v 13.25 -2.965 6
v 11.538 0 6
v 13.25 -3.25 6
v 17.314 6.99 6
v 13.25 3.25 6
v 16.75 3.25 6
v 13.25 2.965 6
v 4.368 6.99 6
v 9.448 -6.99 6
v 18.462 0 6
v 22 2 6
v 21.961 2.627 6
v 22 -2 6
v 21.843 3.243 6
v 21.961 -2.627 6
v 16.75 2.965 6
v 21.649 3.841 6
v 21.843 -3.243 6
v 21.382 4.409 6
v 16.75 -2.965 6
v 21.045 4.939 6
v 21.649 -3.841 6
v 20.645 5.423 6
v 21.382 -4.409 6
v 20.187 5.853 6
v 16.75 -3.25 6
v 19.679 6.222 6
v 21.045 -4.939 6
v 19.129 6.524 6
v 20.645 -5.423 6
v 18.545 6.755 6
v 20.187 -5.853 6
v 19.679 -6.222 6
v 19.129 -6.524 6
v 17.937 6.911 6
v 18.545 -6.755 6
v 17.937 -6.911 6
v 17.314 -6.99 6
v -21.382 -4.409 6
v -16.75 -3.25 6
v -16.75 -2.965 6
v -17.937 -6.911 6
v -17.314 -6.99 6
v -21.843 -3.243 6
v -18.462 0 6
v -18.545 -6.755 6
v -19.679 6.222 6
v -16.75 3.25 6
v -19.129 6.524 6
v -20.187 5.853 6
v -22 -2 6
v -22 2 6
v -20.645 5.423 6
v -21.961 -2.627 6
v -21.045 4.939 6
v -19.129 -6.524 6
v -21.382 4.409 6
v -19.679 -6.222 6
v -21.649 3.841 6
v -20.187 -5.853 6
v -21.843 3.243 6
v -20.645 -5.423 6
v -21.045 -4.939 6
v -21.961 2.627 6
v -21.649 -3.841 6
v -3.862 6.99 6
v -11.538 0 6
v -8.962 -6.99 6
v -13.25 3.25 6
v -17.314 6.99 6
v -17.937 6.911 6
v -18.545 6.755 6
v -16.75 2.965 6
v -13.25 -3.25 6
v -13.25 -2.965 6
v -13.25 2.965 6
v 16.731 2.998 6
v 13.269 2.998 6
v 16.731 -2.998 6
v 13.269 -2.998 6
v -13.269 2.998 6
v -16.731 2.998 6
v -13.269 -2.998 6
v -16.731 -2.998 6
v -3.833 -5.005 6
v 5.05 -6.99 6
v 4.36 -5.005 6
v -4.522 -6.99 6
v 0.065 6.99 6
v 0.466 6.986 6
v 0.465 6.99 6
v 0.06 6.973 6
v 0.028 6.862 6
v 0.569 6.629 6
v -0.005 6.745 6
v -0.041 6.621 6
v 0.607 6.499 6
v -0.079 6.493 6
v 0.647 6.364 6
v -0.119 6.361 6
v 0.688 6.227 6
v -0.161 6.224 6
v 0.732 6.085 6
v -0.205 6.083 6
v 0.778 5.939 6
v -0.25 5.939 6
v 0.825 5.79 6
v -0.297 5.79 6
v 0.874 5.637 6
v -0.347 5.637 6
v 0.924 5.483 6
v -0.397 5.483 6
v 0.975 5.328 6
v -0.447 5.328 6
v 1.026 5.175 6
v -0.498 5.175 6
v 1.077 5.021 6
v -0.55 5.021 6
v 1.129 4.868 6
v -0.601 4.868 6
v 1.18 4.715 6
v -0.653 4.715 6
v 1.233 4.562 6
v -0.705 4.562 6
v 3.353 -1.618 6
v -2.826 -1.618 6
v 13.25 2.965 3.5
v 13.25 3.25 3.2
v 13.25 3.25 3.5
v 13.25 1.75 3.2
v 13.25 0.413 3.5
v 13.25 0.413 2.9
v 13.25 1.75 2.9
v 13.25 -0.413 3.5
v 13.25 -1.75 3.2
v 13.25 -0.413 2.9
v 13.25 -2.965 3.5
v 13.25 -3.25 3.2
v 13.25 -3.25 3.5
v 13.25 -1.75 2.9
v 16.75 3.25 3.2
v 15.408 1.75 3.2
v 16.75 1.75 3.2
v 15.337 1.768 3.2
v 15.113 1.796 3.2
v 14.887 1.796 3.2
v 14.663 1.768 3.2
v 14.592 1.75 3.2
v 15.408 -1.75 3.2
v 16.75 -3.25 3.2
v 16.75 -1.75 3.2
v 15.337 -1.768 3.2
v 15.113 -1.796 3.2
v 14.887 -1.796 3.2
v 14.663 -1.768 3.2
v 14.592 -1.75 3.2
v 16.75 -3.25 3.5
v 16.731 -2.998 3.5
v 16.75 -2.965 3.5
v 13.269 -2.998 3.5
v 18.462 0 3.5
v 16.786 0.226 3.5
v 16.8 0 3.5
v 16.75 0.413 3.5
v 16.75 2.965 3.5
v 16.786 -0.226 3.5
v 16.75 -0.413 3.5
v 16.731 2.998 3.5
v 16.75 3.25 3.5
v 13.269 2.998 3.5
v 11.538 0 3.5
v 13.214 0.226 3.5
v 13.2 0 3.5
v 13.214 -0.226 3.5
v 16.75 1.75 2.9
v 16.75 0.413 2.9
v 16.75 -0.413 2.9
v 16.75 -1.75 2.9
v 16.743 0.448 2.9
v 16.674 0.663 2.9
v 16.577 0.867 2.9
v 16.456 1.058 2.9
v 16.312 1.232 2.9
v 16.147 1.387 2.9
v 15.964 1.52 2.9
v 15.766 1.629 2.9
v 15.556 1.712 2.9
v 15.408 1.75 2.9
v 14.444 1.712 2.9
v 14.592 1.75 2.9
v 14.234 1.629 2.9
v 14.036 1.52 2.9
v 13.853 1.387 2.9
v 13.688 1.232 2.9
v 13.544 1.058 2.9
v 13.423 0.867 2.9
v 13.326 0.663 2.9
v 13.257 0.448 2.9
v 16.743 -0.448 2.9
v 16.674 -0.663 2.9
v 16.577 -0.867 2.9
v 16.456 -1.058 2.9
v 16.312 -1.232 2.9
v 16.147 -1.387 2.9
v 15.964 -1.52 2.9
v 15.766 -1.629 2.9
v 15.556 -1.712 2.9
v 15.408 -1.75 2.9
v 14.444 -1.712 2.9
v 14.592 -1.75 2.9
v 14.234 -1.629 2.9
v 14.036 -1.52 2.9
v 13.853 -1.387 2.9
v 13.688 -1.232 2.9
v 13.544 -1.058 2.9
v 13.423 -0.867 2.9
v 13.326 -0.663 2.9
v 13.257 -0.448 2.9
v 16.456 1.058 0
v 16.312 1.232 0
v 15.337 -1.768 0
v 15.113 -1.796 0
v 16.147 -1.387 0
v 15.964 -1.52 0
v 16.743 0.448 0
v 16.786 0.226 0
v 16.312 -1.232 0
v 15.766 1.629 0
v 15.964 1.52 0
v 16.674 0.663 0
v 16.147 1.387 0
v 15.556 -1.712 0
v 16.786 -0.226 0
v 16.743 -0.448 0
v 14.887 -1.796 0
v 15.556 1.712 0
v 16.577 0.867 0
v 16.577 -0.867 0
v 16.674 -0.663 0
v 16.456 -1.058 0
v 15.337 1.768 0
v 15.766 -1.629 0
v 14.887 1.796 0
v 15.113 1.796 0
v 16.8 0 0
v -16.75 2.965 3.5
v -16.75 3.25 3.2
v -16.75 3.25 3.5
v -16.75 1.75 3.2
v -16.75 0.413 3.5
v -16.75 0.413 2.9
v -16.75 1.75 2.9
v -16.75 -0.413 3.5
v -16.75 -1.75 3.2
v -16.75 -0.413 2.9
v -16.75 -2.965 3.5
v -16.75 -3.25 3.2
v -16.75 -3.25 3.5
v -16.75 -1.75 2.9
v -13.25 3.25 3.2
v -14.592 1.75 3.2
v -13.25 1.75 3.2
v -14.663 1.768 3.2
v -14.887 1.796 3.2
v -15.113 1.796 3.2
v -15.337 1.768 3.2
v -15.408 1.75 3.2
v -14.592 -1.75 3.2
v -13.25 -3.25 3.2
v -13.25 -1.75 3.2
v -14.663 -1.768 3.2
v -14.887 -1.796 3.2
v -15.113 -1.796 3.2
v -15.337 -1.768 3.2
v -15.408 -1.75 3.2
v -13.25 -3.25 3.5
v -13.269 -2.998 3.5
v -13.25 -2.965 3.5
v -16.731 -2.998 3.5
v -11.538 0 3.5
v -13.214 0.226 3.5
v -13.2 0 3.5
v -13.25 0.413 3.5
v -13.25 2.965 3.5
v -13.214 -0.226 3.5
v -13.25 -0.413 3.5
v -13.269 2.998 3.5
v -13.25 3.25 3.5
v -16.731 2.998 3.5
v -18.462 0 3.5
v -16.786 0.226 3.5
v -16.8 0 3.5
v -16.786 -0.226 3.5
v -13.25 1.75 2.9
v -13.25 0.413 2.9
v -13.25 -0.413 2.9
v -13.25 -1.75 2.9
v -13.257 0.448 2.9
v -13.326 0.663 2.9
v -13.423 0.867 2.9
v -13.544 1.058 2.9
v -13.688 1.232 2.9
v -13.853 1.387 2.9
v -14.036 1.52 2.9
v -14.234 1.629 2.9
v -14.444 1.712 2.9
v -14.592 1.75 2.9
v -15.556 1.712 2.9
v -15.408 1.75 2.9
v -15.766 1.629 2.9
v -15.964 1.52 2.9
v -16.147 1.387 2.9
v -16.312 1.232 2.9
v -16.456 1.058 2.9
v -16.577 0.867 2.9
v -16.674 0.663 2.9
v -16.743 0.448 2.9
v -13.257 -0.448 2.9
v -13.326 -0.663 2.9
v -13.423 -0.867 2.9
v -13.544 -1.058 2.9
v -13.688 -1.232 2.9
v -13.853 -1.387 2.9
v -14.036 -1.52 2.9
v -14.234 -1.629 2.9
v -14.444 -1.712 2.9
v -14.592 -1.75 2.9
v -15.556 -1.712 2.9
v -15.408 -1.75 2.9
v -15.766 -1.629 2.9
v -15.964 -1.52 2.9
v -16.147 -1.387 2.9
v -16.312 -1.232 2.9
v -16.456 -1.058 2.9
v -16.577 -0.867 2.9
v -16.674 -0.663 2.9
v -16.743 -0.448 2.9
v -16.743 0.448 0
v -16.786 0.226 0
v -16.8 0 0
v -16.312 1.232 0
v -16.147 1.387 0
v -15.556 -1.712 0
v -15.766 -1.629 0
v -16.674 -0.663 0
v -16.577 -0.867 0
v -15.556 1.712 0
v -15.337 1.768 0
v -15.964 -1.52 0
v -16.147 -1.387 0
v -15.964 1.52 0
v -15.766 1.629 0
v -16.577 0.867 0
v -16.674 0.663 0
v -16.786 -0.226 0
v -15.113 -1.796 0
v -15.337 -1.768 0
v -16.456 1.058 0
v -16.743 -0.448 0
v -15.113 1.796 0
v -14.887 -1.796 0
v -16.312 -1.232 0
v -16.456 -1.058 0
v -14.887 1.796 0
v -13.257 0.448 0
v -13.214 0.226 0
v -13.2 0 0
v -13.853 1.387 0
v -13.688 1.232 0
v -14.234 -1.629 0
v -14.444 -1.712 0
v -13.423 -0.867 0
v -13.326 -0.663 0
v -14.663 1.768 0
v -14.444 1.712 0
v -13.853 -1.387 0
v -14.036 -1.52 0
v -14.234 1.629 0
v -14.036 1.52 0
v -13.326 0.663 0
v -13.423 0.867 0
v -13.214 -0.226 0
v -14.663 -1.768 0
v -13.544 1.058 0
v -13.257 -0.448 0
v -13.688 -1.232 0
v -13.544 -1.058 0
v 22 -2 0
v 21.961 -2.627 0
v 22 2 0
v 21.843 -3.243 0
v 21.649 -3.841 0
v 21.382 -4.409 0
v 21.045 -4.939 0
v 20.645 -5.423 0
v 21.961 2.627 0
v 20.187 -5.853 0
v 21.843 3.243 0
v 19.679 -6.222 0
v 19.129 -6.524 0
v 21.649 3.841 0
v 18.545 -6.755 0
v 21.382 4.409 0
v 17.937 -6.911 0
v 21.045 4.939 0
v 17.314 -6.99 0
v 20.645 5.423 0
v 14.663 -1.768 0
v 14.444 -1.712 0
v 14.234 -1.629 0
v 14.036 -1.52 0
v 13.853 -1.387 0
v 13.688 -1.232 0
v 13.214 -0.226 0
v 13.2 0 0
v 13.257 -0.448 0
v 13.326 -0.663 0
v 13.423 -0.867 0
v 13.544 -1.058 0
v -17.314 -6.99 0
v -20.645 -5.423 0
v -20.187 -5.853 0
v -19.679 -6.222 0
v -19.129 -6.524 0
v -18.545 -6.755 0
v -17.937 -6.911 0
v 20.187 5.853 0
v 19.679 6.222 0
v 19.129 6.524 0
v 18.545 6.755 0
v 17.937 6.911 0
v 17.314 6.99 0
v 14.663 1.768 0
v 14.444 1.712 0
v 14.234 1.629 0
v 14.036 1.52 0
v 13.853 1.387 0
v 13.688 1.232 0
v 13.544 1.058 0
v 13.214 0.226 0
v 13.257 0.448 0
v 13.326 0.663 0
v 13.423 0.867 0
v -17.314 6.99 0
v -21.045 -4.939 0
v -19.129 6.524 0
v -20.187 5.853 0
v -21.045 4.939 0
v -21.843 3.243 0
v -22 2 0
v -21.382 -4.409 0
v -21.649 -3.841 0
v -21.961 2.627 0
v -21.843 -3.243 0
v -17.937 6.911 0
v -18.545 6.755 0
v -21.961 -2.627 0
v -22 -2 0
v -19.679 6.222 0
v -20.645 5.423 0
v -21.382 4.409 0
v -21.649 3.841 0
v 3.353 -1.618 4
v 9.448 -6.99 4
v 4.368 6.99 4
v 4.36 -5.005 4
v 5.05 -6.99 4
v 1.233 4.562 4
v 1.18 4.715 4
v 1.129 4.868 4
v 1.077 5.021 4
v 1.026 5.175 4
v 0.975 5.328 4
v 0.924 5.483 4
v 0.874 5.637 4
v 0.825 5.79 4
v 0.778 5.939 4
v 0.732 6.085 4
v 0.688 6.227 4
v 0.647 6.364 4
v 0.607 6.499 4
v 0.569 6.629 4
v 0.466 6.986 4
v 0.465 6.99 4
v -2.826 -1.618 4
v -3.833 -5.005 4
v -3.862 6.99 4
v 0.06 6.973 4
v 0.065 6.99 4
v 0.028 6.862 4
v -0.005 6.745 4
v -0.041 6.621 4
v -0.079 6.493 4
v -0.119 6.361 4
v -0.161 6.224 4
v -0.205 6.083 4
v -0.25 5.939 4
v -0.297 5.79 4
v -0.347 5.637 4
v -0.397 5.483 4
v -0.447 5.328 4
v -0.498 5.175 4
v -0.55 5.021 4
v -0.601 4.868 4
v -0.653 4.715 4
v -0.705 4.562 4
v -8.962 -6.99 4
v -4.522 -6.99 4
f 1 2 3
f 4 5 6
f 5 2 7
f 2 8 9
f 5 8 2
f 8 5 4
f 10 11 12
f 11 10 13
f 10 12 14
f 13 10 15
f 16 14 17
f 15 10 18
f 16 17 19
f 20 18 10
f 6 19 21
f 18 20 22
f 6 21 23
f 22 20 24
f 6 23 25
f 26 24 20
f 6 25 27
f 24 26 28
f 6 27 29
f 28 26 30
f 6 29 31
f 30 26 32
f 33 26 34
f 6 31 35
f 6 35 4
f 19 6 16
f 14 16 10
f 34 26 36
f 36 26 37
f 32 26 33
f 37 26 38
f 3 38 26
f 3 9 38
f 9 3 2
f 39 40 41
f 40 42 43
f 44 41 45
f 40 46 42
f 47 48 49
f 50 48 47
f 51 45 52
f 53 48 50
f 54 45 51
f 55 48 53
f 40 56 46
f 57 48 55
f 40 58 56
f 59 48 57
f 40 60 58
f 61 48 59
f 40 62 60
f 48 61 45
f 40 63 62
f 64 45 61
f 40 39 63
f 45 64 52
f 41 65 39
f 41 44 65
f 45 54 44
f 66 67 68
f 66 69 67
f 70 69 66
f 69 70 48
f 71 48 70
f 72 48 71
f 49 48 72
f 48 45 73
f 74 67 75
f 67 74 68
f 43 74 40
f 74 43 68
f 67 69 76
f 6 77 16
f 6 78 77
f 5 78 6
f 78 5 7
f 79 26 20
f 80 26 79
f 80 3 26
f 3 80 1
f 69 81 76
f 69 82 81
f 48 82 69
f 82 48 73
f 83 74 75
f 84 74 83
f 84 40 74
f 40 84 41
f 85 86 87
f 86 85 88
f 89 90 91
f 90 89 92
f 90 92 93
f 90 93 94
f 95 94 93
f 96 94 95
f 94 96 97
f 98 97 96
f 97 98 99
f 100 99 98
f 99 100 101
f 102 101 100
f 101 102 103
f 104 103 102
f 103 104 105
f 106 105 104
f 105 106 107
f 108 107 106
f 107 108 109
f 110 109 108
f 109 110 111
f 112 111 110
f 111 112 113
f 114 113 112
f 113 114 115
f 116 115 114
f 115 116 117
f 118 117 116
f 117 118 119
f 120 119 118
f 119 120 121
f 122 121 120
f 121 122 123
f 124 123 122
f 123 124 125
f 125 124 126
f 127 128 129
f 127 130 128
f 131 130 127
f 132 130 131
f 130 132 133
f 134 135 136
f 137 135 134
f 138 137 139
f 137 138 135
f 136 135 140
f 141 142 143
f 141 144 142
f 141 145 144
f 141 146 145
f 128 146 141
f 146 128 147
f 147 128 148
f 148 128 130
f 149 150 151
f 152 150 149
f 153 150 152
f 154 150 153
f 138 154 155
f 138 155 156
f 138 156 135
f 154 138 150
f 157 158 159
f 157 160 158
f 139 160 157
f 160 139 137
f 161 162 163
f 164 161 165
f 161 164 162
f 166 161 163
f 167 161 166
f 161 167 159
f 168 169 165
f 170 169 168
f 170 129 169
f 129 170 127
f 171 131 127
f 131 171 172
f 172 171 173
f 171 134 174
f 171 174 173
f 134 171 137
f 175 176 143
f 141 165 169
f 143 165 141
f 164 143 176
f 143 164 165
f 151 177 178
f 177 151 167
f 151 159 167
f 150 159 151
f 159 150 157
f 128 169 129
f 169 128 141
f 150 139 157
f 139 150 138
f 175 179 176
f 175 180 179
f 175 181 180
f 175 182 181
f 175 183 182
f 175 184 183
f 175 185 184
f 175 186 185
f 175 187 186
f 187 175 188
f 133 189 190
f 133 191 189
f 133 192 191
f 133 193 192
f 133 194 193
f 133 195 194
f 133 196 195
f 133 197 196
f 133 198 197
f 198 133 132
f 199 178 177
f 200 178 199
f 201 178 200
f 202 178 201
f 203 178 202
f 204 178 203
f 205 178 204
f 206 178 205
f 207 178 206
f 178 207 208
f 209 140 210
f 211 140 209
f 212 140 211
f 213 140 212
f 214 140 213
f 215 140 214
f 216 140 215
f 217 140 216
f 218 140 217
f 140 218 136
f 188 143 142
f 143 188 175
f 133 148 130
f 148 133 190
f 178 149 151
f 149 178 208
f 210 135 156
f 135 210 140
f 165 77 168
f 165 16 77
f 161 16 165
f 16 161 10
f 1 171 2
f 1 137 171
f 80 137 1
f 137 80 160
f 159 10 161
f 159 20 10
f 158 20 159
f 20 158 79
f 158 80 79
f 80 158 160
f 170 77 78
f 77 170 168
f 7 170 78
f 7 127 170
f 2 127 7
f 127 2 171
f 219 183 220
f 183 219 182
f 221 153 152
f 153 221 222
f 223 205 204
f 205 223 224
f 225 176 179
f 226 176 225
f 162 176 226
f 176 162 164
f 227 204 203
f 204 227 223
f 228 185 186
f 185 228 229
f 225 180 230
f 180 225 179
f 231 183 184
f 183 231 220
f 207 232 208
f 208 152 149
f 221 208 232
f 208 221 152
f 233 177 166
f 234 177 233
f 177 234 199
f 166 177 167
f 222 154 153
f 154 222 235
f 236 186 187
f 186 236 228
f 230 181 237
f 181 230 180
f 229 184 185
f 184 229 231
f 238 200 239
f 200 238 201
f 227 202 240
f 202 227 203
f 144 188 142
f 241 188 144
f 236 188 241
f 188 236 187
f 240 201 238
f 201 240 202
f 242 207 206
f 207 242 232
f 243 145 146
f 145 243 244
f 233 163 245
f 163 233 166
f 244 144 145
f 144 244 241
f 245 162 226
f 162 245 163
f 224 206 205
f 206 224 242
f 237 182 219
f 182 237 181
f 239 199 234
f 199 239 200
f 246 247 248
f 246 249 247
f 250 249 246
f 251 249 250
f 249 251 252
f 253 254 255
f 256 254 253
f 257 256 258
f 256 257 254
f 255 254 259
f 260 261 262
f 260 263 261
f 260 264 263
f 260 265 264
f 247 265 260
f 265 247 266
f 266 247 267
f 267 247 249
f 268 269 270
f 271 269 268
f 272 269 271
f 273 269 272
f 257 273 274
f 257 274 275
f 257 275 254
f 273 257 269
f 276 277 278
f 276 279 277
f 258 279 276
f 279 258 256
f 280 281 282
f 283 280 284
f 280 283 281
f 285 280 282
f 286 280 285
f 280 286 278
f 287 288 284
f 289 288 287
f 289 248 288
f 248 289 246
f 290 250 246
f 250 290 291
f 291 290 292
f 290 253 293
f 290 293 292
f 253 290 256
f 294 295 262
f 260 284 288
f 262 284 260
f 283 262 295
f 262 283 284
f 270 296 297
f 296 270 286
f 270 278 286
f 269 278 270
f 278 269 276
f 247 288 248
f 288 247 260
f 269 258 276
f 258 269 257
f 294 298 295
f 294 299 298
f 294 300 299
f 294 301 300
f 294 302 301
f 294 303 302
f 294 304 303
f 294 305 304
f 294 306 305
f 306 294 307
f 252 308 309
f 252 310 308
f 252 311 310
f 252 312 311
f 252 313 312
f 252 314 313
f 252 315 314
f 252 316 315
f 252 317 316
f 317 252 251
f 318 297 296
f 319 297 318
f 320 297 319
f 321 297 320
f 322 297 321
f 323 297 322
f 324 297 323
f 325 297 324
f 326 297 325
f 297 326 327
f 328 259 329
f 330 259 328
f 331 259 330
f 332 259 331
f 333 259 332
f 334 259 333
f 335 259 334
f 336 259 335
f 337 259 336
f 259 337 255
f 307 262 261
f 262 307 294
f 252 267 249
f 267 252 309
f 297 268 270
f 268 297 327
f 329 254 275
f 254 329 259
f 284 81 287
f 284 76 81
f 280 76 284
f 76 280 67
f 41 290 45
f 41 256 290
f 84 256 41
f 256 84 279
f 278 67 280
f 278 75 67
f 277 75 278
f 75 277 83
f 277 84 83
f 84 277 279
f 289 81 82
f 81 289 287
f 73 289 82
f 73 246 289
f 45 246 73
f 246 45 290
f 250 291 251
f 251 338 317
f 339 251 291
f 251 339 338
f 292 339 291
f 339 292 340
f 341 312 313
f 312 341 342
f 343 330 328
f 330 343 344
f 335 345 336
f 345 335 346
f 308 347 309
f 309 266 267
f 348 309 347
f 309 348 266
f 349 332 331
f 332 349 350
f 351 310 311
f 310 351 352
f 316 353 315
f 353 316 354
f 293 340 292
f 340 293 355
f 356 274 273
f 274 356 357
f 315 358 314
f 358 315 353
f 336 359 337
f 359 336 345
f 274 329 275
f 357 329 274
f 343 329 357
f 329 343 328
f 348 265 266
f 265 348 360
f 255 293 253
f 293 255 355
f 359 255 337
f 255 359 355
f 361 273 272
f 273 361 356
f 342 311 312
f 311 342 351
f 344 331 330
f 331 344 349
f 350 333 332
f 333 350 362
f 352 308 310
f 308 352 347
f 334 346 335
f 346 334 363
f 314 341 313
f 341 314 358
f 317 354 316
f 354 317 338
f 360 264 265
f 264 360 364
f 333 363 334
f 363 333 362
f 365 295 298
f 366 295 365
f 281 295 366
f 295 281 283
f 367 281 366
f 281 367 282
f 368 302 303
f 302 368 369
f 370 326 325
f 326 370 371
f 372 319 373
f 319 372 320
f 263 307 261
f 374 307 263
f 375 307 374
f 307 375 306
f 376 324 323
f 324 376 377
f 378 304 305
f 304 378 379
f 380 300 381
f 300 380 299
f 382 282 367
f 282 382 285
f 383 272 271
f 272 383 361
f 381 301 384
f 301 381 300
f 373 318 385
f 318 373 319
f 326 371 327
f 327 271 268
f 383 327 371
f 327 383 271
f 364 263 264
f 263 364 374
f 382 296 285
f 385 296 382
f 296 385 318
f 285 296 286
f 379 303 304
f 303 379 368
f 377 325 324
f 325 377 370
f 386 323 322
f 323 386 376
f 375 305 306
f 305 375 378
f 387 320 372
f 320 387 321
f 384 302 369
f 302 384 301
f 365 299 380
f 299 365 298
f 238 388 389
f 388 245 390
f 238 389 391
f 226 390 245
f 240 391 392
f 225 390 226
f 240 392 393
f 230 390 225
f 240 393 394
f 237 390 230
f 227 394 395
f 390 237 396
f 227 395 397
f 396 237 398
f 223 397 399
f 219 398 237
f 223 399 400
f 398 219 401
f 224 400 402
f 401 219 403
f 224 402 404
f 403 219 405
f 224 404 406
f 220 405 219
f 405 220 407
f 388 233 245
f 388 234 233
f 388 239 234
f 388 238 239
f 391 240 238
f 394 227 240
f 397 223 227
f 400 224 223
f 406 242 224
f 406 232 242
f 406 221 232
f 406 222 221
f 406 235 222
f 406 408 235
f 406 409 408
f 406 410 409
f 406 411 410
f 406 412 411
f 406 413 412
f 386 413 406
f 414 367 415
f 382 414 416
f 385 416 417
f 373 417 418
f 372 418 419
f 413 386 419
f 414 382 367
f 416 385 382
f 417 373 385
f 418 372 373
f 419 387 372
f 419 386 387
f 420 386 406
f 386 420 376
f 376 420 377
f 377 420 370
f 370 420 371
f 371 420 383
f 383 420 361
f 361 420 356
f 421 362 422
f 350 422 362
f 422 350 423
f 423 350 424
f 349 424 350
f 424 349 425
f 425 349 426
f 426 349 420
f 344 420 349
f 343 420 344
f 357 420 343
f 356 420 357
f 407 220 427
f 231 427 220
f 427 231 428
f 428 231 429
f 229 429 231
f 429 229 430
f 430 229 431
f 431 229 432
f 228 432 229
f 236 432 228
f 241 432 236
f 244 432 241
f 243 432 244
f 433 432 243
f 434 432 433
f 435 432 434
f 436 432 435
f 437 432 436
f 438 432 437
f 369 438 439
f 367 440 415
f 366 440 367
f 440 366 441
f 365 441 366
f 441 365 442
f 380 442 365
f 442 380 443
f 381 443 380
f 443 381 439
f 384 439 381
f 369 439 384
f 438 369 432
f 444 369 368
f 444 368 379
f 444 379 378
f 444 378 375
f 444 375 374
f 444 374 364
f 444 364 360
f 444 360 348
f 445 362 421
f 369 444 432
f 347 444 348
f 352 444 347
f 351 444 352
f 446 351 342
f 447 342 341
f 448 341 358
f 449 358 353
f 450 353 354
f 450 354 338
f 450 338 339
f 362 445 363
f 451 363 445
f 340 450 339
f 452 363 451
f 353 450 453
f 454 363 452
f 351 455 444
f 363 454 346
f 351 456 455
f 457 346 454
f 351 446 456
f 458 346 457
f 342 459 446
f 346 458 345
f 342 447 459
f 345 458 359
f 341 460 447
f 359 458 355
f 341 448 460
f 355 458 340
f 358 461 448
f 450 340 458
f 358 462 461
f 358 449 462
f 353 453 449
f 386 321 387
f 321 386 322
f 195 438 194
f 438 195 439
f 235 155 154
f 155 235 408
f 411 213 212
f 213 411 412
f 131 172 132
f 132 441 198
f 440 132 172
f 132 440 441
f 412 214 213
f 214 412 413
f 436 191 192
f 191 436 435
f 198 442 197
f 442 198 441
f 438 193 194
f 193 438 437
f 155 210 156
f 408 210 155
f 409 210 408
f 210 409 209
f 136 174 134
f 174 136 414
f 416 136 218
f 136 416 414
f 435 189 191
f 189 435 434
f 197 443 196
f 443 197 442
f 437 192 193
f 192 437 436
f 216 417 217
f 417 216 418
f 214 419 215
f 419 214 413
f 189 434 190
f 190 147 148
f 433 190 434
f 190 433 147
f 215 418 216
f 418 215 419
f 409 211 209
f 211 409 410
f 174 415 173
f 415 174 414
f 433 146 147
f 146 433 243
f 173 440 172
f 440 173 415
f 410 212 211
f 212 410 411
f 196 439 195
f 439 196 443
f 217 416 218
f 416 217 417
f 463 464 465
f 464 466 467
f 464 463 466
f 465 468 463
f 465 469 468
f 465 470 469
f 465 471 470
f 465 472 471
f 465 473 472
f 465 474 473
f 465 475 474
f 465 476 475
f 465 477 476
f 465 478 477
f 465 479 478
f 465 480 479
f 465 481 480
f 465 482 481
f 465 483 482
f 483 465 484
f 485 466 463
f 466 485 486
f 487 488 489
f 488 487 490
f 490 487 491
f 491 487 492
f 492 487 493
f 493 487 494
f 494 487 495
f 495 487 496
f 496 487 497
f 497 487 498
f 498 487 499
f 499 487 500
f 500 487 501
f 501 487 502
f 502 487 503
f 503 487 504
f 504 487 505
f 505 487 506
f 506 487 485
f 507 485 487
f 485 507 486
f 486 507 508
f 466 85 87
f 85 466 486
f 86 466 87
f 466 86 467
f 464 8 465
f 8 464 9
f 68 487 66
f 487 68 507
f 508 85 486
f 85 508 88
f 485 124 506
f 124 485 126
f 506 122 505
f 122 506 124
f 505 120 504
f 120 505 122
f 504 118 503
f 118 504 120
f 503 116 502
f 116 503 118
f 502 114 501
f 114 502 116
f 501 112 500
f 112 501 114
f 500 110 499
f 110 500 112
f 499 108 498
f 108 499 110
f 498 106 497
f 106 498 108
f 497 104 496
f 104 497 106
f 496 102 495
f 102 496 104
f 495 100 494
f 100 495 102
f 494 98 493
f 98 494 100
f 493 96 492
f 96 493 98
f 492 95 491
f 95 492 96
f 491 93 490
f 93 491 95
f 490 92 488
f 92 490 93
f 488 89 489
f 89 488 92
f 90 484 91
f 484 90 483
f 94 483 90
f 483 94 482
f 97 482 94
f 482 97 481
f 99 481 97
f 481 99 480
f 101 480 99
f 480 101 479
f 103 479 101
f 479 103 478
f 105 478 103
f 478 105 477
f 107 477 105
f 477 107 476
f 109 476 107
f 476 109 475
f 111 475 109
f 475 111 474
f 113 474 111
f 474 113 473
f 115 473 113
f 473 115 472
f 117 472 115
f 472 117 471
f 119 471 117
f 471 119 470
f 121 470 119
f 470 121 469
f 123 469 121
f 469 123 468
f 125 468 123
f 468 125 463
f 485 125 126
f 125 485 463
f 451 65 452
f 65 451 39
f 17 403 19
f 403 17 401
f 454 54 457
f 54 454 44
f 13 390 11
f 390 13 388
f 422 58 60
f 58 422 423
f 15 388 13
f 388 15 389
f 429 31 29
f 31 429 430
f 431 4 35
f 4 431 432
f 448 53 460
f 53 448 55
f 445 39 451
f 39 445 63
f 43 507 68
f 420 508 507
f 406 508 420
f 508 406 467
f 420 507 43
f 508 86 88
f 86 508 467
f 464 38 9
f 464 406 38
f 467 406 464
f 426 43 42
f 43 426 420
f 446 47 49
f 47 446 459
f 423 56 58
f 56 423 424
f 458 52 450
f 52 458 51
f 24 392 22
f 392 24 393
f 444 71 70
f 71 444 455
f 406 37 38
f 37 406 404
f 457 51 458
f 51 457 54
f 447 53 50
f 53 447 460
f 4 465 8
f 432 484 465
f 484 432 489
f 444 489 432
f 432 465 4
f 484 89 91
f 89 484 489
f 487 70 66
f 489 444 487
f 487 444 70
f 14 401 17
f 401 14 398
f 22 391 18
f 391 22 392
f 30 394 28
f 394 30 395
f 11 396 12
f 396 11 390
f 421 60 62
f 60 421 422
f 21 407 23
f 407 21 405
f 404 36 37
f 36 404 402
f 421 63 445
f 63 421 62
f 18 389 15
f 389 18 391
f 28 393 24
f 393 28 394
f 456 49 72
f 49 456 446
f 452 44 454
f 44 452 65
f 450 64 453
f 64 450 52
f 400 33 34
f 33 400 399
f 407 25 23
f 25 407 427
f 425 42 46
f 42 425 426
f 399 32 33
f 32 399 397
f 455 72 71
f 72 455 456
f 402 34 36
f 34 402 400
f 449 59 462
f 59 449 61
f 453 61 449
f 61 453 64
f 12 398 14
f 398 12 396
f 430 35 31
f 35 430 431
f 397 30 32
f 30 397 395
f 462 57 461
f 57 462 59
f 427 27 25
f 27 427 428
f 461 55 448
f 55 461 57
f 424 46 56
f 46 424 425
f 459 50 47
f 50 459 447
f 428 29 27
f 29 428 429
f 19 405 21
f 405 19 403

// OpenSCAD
$fn = 50;


difference() {
	union() {
		hull() {
			translate(v = [-17.0000000000, 2.0000000000, 0]) {
				cylinder(h = 6, r = 5);
			}
			translate(v = [17.0000000000, 2.0000000000, 0]) {
				cylinder(h = 6, r = 5);
			}
			translate(v = [-17.0000000000, -2.0000000000, 0]) {
				cylinder(h = 6, r = 5);
			}
			translate(v = [17.0000000000, -2.0000000000, 0]) {
				cylinder(h = 6, r = 5);
			}
		}
	}
	union() {
		translate(v = [15.0000000000, 0, -20]) {
			rotate(a = [0, 180, 0]) {
				difference() {
					union() {
						translate(v = [0, 0, -26.0000000000]) {
							rotate(a = [0, 0, 0]) {
								difference() {
									union() {
										#translate(v = [-1.7500000000, -3.2500000000, -0.3000000000]) {
											cube(size = [3.5000000000, 6.5000000000, 0.3000000000]);
										}
										#translate(v = [-1.7500000000, -1.7500000000, -0.6000000000]) {
											cube(size = [3.5000000000, 3.5000000000, 0.3000000000]);
										}
										#translate(v = [-1.7500000000, -3.2500000000, 2.5000000000]) {
											cube(size = [3.5000000000, 6.5000000000, 0.3000000000]);
										}
										#translate(v = [-1.7500000000, -1.7500000000, 2.8000000000]) {
											cube(size = [3.5000000000, 3.5000000000, 0.3000000000]);
										}
										#linear_extrude(height = 2.5000000000) {
											polygon(points = [[3.4620000000, 0.0000000000], [1.7310000000, 2.9981799479], [-1.7310000000, 2.9981799479], [-3.4620000000, 0.0000000000], [-1.7310000000, -2.9981799479], [1.7310000000, -2.9981799479]]);
										}
										#translate(v = [-1.7500000000, -3.2500000000, -0.3000000000]) {
											cube(size = [3.5000000000, 6.5000000000, 0.3000000000]);
										}
										#translate(v = [-1.7500000000, -1.7500000000, -0.6000000000]) {
											cube(size = [3.5000000000, 3.5000000000, 0.3000000000]);
										}
										#translate(v = [-1.7500000000, -3.2500000000, 2.5000000000]) {
											cube(size = [3.5000000000, 6.5000000000, 0.3000000000]);
										}
										#translate(v = [-1.7500000000, -1.7500000000, 2.8000000000]) {
											cube(size = [3.5000000000, 3.5000000000, 0.3000000000]);
										}
										#translate(v = [-1.7500000000, -3.2500000000, -0.3000000000]) {
											cube(size = [3.5000000000, 6.5000000000, 0.3000000000]);
										}
										#translate(v = [-1.7500000000, -1.7500000000, -0.6000000000]) {
											cube(size = [3.5000000000, 3.5000000000, 0.3000000000]);
										}
										#translate(v = [-1.7500000000, -3.2500000000, 2.5000000000]) {
											cube(size = [3.5000000000, 6.5000000000, 0.3000000000]);
										}
										#translate(v = [-1.7500000000, -1.7500000000, 2.8000000000]) {
											cube(size = [3.5000000000, 3.5000000000, 0.3000000000]);
										}
									}
									union();
								}
							}
						}
						translate(v = [0, 0, -26.0000000000]) {
							rotate(a = [0, 0, 0]) {
								difference() {
									union() {
										#translate(v = [-1.7500000000, -3.2500000000, -0.3000000000]) {
											cube(size = [3.5000000000, 6.5000000000, 0.3000000000]);
										}
										#translate(v = [-1.7500000000, -1.7500000000, -0.6000000000]) {
											cube(size = [3.5000000000, 3.5000000000, 0.3000000000]);
										}
										#translate(v = [-1.7500000000, -3.2500000000, 2.5000000000]) {
											cube(size = [3.5000000000, 6.5000000000, 0.3000000000]);
										}
										#translate(v = [-1.7500000000, -1.7500000000, 2.8000000000]) {
											cube(size = [3.5000000000, 3.5000000000, 0.3000000000]);
										}
										#linear_extrude(height = 2.5000000000) {
											polygon(points = [[3.4620000000, 0.0000000000], [1.7310000000, 2.9981799479], [-1.7310000000, 2.9981799479], [-3.4620000000, 0.0000000000], [-1.7310000000, -2.9981799479], [1.7310000000, -2.9981799479]]);
										}
										#translate(v = [-1.7500000000, -3.2500000000, -0.3000000000]) {
											cube(size = [3.5000000000, 6.5000000000, 0.3000000000]);
										}
										#translate(v = [-1.7500000000, -1.7500000000, -0.6000000000]) {
											cube(size = [3.5000000000, 3.5000000000, 0.3000000000]);
										}
										#translate(v = [-1.7500000000, -3.2500000000, 2.5000000000]) {
											cube(size = [3.5000000000, 6.5000000000, 0.3000000000]);
										}
										#translate(v = [-1.7500000000, -1.7500000000, 2.8000000000]) {
											cube(size = [3.5000000000, 3.5000000000, 0.3000000000]);
										}
										#translate(v = [-1.7500000000, -3.2500000000, -0.3000000000]) {
											cube(size = [3.5000000000, 6.5000000000, 0.3000000000]);
										}
										#translate(v = [-1.7500000000, -1.7500000000, -0.6000000000]) {
											cube(size = [3.5000000000, 3.5000000000, 0.3000000000]);
										}
										#translate(v = [-1.7500000000, -3.2500000000, 2.5000000000]) {
											cube(size = [3.5000000000, 6.5000000000, 0.3000000000]);
										}
										#translate(v = [-1.7500000000, -1.7500000000, 2.8000000000]) {
											cube(size = [3.5000000000, 3.5000000000, 0.3000000000]);
										}
									}
									union();
								}
							}
						}
						translate(v = [0, 0, -26.0000000000]) {
							rotate(a = [0, 0, 0]) {
								difference() {
									union() {
										#translate(v = [-1.7500000000, -3.2500000000, -0.3000000000]) {
											cube(size = [3.5000000000, 6.5000000000, 0.3000000000]);
										}
										#translate(v = [-1.7500000000, -1.7500000000, -0.6000000000]) {
											cube(size = [3.5000000000, 3.5000000000, 0.3000000000]);
										}
										#translate(v = [-1.7500000000, -3.2500000000, 2.5000000000]) {
											cube(size = [3.5000000000, 6.5000000000, 0.3000000000]);
										}
										#translate(v = [-1.7500000000, -1.7500000000, 2.8000000000]) {
											cube(size = [3.5000000000, 3.5000000000, 0.3000000000]);
										}
										#linear_extrude(height = 2.5000000000) {
											polygon(points = [[3.4620000000, 0.0000000000], [1.7310000000, 2.9981799479], [-1.7310000000, 2.9981799479], [-3.4620000000, 0.0000000000], [-1.7310000000, -2.9981799479], [1.7310000000, -2.9981799479]]);
										}
										#translate(v = [-1.7500000000, -3.2500000000, -0.3000000000]) {
											cube(size = [3.5000000000, 6.5000000000, 0.3000000000]);
										}
										#translate(v = [-1.7500000000, -1.7500000000, -0.6000000000]) {
											cube(size = [3.5000000000, 3.5000000000, 0.3000000000]);
										}
										#translate(v = [-1.7500000000, -3.2500000000, 2.5000000000]) {
											cube(size = [3.5000000000, 6.5000000000, 0.3000000000]);
										}
										#translate(v = [-1.7500000000, -1.7500000000, 2.8000000000]) {
											cube(size = [3.5000000000, 3.5000000000, 0.3000000000]);
										}
										#translate(v = [-1.7500000000, -3.2500000000, -0.3000000000]) {
											cube(size = [3.5000000000, 6.5000000000, 0.3000000000]);
										}
										#translate(v = [-1.7500000000, -1.7500000000, -0.6000000000]) {
											cube(size = [3.5000000000, 3.5000000000, 0.3000000000]);
										}
										#translate(v = [-1.7500000000, -3.2500000000, 2.5000000000]) {
											cube(size = [3.5000000000, 6.5000000000, 0.3000000000]);
										}
										#translate(v = [-1.7500000000, -1.7500000000, 2.8000000000]) {
											cube(size = [3.5000000000, 3.5000000000, 0.3000000000]);
										}
									}
									union();
								}
							}
						}
						#translate(v = [0, 0, -26.0000000000]) {
							cylinder(h = 26, r = 1.5000000000);
						}
						#translate(v = [0, 0, -1.9000000000]) {
							cylinder(h = 1.9000000000, r1 = 1.8000000000, r2 = 3.6000000000);
						}
						#translate(v = [0, 0, -26.0000000000]) {
							cylinder(h = 26, r = 1.8000000000);
						}
						#translate(v = [0, 0, -26.0000000000]) {
							cylinder(h = 26, r = 1.5000000000);
						}
					}
					union();
				}
			}
		}
		translate(v = [-15.0000000000, 0, -20]) {
			rotate(a = [0, 180, 0]) {
				difference() {
					union() {
						translate(v = [0, 0, -26.0000000000]) {
							rotate(a = [0, 0, 0]) {
								difference() {
									union() {
										#translate(v = [-1.7500000000, -3.2500000000, -0.3000000000]) {
											cube(size = [3.5000000000, 6.5000000000, 0.3000000000]);
										}
										#translate(v = [-1.7500000000, -1.7500000000, -0.6000000000]) {
											cube(size = [3.5000000000, 3.5000000000, 0.3000000000]);
										}
										#translate(v = [-1.7500000000, -3.2500000000, 2.5000000000]) {
											cube(size = [3.5000000000, 6.5000000000, 0.3000000000]);
										}
										#translate(v = [-1.7500000000, -1.7500000000, 2.8000000000]) {
											cube(size = [3.5000000000, 3.5000000000, 0.3000000000]);
										}
										#linear_extrude(height = 2.5000000000) {
											polygon(points = [[3.4620000000, 0.0000000000], [1.7310000000, 2.9981799479], [-1.7310000000, 2.9981799479], [-3.4620000000, 0.0000000000], [-1.7310000000, -2.9981799479], [1.7310000000, -2.9981799479]]);
										}
										#translate(v = [-1.7500000000, -3.2500000000, -0.3000000000]) {
											cube(size = [3.5000000000, 6.5000000000, 0.3000000000]);
										}
										#translate(v = [-1.7500000000, -1.7500000000, -0.6000000000]) {
											cube(size = [3.5000000000, 3.5000000000, 0.3000000000]);
										}
										#translate(v = [-1.7500000000, -3.2500000000, 2.5000000000]) {
											cube(size = [3.5000000000, 6.5000000000, 0.3000000000]);
										}
										#translate(v = [-1.7500000000, -1.7500000000, 2.8000000000]) {
											cube(size = [3.5000000000, 3.5000000000, 0.3000000000]);
										}
										#translate(v = [-1.7500000000, -3.2500000000, -0.3000000000]) {
											cube(size = [3.5000000000, 6.5000000000, 0.3000000000]);
										}
										#translate(v = [-1.7500000000, -1.7500000000, -0.6000000000]) {
											cube(size = [3.5000000000, 3.5000000000, 0.3000000000]);
										}
										#translate(v = [-1.7500000000, -3.2500000000, 2.5000000000]) {
											cube(size = [3.5000000000, 6.5000000000, 0.3000000000]);
										}
										#translate(v = [-1.7500000000, -1.7500000000, 2.8000000000]) {
											cube(size = [3.5000000000, 3.5000000000, 0.3000000000]);
										}
									}
									union();
								}
							}
						}
						translate(v = [0, 0, -26.0000000000]) {
							rotate(a = [0, 0, 0]) {
								difference() {
									union() {
										#translate(v = [-1.7500000000, -3.2500000000, -0.3000000000]) {
											cube(size = [3.5000000000, 6.5000000000, 0.3000000000]);
										}
										#translate(v = [-1.7500000000, -1.7500000000, -0.6000000000]) {
											cube(size = [3.5000000000, 3.5000000000, 0.3000000000]);
										}
										#translate(v = [-1.7500000000, -3.2500000000, 2.5000000000]) {
											cube(size = [3.5000000000, 6.5000000000, 0.3000000000]);
										}
										#translate(v = [-1.7500000000, -1.7500000000, 2.8000000000]) {
											cube(size = [3.5000000000, 3.5000000000, 0.3000000000]);
										}
										#linear_extrude(height = 2.5000000000) {
											polygon(points = [[3.4620000000, 0.0000000000], [1.7310000000, 2.9981799479], [-1.7310000000, 2.9981799479], [-3.4620000000, 0.0000000000], [-1.7310000000, -2.9981799479], [1.7310000000, -2.9981799479]]);
										}
										#translate(v = [-1.7500000000, -3.2500000000, -0.3000000000]) {
											cube(size = [3.5000000000, 6.5000000000, 0.3000000000]);
										}
										#translate(v = [-1.7500000000, -1.7500000000, -0.6000000000]) {
											cube(size = [3.5000000000, 3.5000000000, 0.3000000000]);
										}
										#translate(v = [-1.7500000000, -3.2500000000, 2.5000000000]) {
											cube(size = [3.5000000000, 6.5000000000, 0.3000000000]);
										}
										#translate(v = [-1.7500000000, -1.7500000000, 2.8000000000]) {
											cube(size = [3.5000000000, 3.5000000000, 0.3000000000]);
										}
										#translate(v = [-1.7500000000, -3.2500000000, -0.3000000000]) {
											cube(size = [3.5000000000, 6.5000000000, 0.3000000000]);
										}
										#translate(v = [-1.7500000000, -1.7500000000, -0.6000000000]) {
											cube(size = [3.5000000000, 3.5000000000, 0.3000000000]);
										}
										#translate(v = [-1.7500000000, -3.2500000000, 2.5000000000]) {
											cube(size = [3.5000000000, 6.5000000000, 0.3000000000]);
										}
										#translate(v = [-1.7500000000, -1.7500000000, 2.8000000000]) {
											cube(size = [3.5000000000, 3.5000000000, 0.3000000000]);
										}
									}
									union();
								}
							}
						}
						translate(v = [0, 0, -26.0000000000]) {
							rotate(a = [0, 0, 0]) {
								difference() {
									union() {
										#translate(v = [-1.7500000000, -3.2500000000, -0.3000000000]) {
											cube(size = [3.5000000000, 6.5000000000, 0.3000000000]);
										}
										#translate(v = [-1.7500000000, -1.7500000000, -0.6000000000]) {
											cube(size = [3.5000000000, 3.5000000000, 0.3000000000]);
										}
										#translate(v = [-1.7500000000, -3.2500000000, 2.5000000000]) {
											cube(size = [3.5000000000, 6.5000000000, 0.3000000000]);
										}
										#translate(v = [-1.7500000000, -1.7500000000, 2.8000000000]) {
											cube(size = [3.5000000000, 3.5000000000, 0.3000000000]);
										}
										#linear_extrude(height = 2.5000000000) {
											polygon(points = [[3.4620000000, 0.0000000000], [1.7310000000, 2.9981799479], [-1.7310000000, 2.9981799479], [-3.4620000000, 0.0000000000], [-1.7310000000, -2.9981799479], [1.7310000000, -2.9981799479]]);
										}
										#translate(v = [-1.7500000000, -3.2500000000, -0.3000000000]) {
											cube(size = [3.5000000000, 6.5000000000, 0.3000000000]);
										}
										#translate(v = [-1.7500000000, -1.7500000000, -0.6000000000]) {
											cube(size = [3.5000000000, 3.5000000000, 0.3000000000]);
										}
										#translate(v = [-1.7500000000, -3.2500000000, 2.5000000000]) {
											cube(size = [3.5000000000, 6.5000000000, 0.3000000000]);
										}
										#translate(v = [-1.7500000000, -1.7500000000, 2.8000000000]) {
											cube(size = [3.5000000000, 3.5000000000, 0.3000000000]);
										}
										#translate(v = [-1.7500000000, -3.2500000000, -0.3000000000]) {
											cube(size = [3.5000000000, 6.5000000000, 0.3000000000]);
										}
										#translate(v = [-1.7500000000, -1.7500000000, -0.6000000000]) {
											cube(size = [3.5000000000, 3.5000000000, 0.3000000000]);
										}
										#translate(v = [-1.7500000000, -3.2500000000, 2.5000000000]) {
											cube(size = [3.5000000000, 6.5000000000, 0.3000000000]);
										}
										#translate(v = [-1.7500000000, -1.7500000000, 2.8000000000]) {
											cube(size = [3.5000000000, 3.5000000000, 0.3000000000]);
										}
									}
									union();
								}
							}
						}
						#translate(v = [0, 0, -26.0000000000]) {
							cylinder(h = 26, r = 1.5000000000);
						}
						#translate(v = [0, 0, -1.9000000000]) {
							cylinder(h = 1.9000000000, r1 = 1.8000000000, r2 = 3.6000000000);
						}
						#translate(v = [0, 0, -26.0000000000]) {
							cylinder(h = 26, r = 1.8000000000);
						}
						#translate(v = [0, 0, -26.0000000000]) {
							cylinder(h = 26, r = 1.5000000000);
						}
					}
					union();
				}
			}
		}
		translate(v = [-15.0000000000, 0.0000000000, 0]) {
			cylinder(h = 6, r = 1.8000000000);
		}
		translate(v = [15.0000000000, 0.0000000000, 0]) {
			cylinder(h = 6, r = 1.8000000000);
		}
		translate(v = [-15.0000000000, 0.0000000000, 0]) {
			cylinder(h = 6, r = 1.8000000000);
		}
		translate(v = [15.0000000000, 0.0000000000, 0]) {
			cylinder(h = 6, r = 1.8000000000);
		}
		translate(v = [-15.0000000000, 0.0000000000, 0]) {
			cylinder(h = 6, r = 1.8000000000);
		}
		translate(v = [15.0000000000, 0.0000000000, 0]) {
			cylinder(h = 6, r = 1.8000000000);
		}
		translate(v = [-15.0000000000, 0.0000000000, 0]) {
			cylinder(h = 6, r = 1.8000000000);
		}
		translate(v = [15.0000000000, 0.0000000000, 0]) {
			cylinder(h = 6, r = 1.8000000000);
		}
		#translate(v = [0, 0, 4]) {
			linear_extrude(height = 2) {
				text(font = "Arial:Bold", halign = "center", size = 22.5000000000, text = "A", valign = "center");
			}
		}
	}
}
